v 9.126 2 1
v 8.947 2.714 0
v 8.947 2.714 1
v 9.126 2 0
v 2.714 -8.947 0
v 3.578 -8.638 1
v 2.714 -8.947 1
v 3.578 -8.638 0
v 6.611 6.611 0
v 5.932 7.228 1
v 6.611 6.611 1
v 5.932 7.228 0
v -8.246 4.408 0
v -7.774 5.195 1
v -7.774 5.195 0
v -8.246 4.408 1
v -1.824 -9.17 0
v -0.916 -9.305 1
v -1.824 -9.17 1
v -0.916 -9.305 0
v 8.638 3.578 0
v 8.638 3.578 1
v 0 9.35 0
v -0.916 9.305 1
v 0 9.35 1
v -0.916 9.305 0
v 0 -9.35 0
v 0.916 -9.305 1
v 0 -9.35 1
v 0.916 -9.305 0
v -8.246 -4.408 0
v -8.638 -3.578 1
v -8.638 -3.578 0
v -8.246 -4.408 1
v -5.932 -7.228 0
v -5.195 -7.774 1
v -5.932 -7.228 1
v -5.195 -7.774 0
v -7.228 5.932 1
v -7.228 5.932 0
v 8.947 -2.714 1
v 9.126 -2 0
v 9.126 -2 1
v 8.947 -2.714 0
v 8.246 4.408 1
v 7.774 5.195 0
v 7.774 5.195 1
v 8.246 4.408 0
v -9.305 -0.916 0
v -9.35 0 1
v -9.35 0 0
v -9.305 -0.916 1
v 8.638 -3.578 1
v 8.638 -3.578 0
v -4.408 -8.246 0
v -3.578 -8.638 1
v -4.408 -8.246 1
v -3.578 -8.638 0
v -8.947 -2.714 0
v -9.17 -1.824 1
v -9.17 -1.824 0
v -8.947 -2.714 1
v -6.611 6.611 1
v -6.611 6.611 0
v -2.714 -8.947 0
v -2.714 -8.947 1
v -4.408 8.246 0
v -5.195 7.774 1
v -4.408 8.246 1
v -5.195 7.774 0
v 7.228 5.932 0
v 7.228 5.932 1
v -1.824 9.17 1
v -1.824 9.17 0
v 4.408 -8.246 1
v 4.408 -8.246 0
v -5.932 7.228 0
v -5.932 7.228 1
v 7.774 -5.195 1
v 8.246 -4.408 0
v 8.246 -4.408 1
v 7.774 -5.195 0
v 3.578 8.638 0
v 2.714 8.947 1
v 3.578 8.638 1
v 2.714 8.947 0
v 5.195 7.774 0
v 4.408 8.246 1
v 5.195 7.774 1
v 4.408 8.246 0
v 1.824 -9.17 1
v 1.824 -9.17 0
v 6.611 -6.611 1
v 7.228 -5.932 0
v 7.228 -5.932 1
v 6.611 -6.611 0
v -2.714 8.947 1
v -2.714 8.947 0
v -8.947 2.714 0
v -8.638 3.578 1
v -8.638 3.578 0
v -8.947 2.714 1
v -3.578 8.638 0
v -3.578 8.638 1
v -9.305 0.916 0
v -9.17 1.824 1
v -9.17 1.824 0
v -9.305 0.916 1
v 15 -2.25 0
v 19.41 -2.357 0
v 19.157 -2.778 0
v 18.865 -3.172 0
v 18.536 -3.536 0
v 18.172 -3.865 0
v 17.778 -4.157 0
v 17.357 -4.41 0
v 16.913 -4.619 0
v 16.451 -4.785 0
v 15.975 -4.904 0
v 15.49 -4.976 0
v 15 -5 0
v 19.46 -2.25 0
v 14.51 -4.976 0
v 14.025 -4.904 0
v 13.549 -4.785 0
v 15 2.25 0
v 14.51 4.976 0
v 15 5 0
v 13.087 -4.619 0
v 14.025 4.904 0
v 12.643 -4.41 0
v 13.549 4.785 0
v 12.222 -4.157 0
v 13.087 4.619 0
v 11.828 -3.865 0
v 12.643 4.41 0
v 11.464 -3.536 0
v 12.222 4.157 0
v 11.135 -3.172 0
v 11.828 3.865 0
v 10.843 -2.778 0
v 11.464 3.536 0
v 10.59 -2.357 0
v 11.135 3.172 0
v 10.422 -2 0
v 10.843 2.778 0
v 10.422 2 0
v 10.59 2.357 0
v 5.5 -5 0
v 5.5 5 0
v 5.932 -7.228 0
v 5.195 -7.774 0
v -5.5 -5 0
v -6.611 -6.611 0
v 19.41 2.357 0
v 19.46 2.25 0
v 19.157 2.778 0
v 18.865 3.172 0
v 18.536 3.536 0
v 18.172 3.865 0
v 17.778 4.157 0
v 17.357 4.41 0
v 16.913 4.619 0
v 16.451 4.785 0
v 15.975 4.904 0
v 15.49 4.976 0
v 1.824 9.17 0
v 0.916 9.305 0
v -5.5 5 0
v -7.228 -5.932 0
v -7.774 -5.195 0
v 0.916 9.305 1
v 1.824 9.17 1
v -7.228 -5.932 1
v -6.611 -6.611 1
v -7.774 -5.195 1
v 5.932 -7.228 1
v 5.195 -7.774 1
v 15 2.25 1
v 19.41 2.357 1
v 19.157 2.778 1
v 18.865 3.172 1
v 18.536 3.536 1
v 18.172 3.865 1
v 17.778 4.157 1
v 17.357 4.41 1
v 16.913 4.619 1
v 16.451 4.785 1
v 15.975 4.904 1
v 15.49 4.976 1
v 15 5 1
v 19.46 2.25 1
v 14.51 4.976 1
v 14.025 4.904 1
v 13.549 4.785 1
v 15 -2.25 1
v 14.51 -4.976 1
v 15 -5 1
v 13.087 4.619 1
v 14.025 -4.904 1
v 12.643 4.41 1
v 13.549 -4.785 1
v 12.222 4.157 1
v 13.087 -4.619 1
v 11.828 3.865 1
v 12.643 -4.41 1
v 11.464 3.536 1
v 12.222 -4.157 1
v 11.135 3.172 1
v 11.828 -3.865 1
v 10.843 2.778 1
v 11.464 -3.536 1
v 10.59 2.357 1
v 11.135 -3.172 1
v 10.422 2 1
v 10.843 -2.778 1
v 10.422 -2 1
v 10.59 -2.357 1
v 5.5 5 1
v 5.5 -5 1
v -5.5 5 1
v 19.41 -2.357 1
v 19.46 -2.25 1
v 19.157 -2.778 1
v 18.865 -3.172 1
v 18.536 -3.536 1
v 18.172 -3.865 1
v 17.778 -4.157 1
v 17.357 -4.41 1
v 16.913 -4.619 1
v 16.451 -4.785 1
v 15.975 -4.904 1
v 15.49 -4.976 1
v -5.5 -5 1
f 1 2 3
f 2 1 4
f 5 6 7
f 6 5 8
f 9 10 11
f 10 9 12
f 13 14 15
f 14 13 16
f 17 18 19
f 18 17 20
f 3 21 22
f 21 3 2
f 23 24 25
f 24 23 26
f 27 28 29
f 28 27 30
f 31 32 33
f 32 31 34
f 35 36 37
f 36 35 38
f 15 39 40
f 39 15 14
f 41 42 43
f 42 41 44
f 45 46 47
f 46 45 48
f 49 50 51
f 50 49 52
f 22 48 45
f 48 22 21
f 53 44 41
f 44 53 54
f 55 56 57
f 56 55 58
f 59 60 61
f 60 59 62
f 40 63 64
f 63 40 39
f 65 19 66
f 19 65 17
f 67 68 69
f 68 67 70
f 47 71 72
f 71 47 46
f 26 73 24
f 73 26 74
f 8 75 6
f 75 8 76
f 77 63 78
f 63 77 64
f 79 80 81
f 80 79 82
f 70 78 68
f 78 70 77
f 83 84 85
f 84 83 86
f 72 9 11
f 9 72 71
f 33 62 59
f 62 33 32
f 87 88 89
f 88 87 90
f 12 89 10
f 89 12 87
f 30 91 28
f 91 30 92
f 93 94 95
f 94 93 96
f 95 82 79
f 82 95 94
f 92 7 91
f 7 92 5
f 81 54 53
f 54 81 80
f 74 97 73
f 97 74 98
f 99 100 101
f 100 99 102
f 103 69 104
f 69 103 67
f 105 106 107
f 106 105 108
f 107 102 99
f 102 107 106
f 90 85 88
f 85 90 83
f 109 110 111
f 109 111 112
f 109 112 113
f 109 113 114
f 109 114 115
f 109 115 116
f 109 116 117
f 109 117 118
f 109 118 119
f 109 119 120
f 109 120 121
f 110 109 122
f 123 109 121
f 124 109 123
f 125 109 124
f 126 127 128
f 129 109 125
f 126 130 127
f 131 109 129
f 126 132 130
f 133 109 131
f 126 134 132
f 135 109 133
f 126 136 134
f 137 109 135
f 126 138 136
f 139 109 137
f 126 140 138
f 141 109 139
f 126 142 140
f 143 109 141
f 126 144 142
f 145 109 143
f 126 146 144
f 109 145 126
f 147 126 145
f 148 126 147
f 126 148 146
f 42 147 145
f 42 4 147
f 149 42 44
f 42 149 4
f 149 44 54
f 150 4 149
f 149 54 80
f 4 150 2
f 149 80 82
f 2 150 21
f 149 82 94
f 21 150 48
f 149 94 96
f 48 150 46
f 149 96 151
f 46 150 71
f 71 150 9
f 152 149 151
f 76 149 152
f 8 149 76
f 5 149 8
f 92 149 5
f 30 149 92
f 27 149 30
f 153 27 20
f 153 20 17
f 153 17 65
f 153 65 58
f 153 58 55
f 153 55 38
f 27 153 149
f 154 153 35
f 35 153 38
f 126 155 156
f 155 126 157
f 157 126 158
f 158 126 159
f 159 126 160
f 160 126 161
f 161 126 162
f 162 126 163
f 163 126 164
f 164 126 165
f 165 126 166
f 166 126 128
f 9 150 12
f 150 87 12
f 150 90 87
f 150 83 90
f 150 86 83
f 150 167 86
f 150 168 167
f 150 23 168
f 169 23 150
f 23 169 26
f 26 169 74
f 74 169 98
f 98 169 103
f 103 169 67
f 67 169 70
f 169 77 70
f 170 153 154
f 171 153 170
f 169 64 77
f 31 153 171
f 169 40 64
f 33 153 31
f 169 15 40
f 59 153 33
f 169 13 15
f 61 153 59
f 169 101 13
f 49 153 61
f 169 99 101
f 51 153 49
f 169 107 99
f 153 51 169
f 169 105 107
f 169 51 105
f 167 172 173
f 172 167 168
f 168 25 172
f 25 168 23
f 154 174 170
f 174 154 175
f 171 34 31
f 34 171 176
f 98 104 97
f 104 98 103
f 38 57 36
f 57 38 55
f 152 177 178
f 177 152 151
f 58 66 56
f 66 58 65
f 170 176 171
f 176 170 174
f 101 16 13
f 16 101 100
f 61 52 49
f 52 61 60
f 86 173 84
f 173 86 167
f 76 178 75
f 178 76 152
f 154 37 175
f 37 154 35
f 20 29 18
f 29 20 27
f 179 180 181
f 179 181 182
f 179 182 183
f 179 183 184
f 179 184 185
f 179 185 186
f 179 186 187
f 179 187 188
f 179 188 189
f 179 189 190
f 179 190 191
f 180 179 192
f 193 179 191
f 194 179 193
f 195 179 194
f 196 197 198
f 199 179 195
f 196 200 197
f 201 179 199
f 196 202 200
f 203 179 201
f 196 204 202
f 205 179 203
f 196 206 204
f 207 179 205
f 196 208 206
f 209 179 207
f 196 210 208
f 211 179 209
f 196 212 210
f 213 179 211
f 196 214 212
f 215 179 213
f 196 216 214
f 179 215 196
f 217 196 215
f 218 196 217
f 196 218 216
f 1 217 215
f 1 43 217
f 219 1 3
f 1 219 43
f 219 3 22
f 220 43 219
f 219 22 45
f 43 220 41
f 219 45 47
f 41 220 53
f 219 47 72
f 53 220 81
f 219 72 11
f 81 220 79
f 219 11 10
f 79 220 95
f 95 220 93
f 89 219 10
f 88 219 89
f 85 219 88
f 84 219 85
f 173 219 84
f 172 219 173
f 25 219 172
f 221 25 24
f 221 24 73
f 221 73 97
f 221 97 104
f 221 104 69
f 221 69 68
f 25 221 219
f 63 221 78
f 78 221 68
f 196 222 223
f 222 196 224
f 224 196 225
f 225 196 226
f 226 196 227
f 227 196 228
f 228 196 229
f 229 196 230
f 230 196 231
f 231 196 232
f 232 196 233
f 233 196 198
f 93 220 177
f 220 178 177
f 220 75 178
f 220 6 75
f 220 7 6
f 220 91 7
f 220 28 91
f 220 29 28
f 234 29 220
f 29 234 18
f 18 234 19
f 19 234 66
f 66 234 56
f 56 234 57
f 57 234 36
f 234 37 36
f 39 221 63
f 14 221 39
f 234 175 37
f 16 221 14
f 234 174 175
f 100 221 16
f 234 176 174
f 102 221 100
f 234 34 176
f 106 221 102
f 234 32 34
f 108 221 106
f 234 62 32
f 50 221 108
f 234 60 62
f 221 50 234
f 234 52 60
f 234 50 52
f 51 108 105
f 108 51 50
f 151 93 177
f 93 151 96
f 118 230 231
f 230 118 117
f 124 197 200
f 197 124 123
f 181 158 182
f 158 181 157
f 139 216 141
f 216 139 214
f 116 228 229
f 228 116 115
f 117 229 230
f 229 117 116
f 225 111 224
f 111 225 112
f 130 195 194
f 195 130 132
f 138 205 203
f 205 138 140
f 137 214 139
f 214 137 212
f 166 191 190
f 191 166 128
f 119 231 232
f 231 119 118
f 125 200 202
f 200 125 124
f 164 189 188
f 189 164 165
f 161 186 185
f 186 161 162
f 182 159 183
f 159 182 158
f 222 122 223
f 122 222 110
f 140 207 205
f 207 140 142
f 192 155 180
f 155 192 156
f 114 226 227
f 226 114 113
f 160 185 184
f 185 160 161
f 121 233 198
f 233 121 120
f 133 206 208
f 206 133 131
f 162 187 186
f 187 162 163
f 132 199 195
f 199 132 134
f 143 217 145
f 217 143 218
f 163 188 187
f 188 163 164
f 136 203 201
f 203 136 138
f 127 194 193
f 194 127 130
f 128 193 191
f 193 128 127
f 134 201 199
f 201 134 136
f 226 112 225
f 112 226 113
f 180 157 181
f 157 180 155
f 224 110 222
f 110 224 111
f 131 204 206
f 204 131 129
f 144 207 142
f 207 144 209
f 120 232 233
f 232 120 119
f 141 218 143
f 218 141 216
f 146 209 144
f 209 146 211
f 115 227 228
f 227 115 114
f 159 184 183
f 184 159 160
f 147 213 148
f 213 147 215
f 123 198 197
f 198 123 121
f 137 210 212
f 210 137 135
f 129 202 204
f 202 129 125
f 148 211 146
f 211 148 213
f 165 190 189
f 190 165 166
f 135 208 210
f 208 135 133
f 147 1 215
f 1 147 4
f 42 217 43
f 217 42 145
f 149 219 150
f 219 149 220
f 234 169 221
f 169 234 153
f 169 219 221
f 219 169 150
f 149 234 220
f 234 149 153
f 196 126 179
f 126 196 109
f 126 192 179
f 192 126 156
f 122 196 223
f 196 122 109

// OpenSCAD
// Stand rod and tubing clip - prints flat as a 2-D profile in the XY plane
// Units: mm. $fn = 64 for curved shapes.

// ---------------- Parameters ----------------
ring_d        = 12.7;   // stand rod ring inner diameter
ring_wall     = 3;      // stand rod ring wall thickness
ring_outer    = ring_d + 2 * ring_wall; // stand rod ring outer diameter (18.7)
ring_open_w   = 10;     // stand rod ring opening width on -X side
ring_open_y   = 5;      // stand rod ring opening extends y = -5 to +5

tub_d         = 6;      // tubing ring inner diameter
tub_wall      = 2;      // tubing ring wall thickness
tub_outer     = tub_d + 2 * tub_wall;   // tubing ring outer diameter (10)
tub_open_w    = 4.5;    // tubing ring opening width on +X side
tub_open_y    = 2.25;   // tubing ring opening extends y = -2.25 to +2.25

bridge_x0     = 8;      // bridge start (X)
bridge_x1     = 12;     // bridge end (X)
bridge_w      = bridge_x1 - bridge_x0;  // bridge width (Y) = 4 mm (check!)

eps           = 0.5;    // cutter overshoot past faces

$fn = 64;

// ---------------- Model ----------------
difference() {
    union() {
        // Stand rod ring
        cylinder(d = ring_outer, h = 1, $fn = 64);
        // Tubing ring
        translate([15, 0, 0])
            cylinder(d = tub_outer, h = 1, $fn = 64);
        // Solid bridge between x = 8 and x = 12
        translate([bridge_x0, -bridge_w / 2, 0])
            cube([bridge_w, bridge_w, 1]);
    }
    // Stand rod opening: x < 0, -5 < y < 5
    translate([-ring_open_w / 2 - eps, -ring_open_y, -eps])
        cube([ring_open_w + 2 * eps, 2 * ring_open_y, 1 + 2 * eps]);
    // Tubing opening: x > 15, -2.25 < y < 2.25
    translate([15, -tub_open_y, -eps])
        cube([tub_open_w + 2 * eps, 2 * tub_open_y, 1 + 2 * eps]);
}
